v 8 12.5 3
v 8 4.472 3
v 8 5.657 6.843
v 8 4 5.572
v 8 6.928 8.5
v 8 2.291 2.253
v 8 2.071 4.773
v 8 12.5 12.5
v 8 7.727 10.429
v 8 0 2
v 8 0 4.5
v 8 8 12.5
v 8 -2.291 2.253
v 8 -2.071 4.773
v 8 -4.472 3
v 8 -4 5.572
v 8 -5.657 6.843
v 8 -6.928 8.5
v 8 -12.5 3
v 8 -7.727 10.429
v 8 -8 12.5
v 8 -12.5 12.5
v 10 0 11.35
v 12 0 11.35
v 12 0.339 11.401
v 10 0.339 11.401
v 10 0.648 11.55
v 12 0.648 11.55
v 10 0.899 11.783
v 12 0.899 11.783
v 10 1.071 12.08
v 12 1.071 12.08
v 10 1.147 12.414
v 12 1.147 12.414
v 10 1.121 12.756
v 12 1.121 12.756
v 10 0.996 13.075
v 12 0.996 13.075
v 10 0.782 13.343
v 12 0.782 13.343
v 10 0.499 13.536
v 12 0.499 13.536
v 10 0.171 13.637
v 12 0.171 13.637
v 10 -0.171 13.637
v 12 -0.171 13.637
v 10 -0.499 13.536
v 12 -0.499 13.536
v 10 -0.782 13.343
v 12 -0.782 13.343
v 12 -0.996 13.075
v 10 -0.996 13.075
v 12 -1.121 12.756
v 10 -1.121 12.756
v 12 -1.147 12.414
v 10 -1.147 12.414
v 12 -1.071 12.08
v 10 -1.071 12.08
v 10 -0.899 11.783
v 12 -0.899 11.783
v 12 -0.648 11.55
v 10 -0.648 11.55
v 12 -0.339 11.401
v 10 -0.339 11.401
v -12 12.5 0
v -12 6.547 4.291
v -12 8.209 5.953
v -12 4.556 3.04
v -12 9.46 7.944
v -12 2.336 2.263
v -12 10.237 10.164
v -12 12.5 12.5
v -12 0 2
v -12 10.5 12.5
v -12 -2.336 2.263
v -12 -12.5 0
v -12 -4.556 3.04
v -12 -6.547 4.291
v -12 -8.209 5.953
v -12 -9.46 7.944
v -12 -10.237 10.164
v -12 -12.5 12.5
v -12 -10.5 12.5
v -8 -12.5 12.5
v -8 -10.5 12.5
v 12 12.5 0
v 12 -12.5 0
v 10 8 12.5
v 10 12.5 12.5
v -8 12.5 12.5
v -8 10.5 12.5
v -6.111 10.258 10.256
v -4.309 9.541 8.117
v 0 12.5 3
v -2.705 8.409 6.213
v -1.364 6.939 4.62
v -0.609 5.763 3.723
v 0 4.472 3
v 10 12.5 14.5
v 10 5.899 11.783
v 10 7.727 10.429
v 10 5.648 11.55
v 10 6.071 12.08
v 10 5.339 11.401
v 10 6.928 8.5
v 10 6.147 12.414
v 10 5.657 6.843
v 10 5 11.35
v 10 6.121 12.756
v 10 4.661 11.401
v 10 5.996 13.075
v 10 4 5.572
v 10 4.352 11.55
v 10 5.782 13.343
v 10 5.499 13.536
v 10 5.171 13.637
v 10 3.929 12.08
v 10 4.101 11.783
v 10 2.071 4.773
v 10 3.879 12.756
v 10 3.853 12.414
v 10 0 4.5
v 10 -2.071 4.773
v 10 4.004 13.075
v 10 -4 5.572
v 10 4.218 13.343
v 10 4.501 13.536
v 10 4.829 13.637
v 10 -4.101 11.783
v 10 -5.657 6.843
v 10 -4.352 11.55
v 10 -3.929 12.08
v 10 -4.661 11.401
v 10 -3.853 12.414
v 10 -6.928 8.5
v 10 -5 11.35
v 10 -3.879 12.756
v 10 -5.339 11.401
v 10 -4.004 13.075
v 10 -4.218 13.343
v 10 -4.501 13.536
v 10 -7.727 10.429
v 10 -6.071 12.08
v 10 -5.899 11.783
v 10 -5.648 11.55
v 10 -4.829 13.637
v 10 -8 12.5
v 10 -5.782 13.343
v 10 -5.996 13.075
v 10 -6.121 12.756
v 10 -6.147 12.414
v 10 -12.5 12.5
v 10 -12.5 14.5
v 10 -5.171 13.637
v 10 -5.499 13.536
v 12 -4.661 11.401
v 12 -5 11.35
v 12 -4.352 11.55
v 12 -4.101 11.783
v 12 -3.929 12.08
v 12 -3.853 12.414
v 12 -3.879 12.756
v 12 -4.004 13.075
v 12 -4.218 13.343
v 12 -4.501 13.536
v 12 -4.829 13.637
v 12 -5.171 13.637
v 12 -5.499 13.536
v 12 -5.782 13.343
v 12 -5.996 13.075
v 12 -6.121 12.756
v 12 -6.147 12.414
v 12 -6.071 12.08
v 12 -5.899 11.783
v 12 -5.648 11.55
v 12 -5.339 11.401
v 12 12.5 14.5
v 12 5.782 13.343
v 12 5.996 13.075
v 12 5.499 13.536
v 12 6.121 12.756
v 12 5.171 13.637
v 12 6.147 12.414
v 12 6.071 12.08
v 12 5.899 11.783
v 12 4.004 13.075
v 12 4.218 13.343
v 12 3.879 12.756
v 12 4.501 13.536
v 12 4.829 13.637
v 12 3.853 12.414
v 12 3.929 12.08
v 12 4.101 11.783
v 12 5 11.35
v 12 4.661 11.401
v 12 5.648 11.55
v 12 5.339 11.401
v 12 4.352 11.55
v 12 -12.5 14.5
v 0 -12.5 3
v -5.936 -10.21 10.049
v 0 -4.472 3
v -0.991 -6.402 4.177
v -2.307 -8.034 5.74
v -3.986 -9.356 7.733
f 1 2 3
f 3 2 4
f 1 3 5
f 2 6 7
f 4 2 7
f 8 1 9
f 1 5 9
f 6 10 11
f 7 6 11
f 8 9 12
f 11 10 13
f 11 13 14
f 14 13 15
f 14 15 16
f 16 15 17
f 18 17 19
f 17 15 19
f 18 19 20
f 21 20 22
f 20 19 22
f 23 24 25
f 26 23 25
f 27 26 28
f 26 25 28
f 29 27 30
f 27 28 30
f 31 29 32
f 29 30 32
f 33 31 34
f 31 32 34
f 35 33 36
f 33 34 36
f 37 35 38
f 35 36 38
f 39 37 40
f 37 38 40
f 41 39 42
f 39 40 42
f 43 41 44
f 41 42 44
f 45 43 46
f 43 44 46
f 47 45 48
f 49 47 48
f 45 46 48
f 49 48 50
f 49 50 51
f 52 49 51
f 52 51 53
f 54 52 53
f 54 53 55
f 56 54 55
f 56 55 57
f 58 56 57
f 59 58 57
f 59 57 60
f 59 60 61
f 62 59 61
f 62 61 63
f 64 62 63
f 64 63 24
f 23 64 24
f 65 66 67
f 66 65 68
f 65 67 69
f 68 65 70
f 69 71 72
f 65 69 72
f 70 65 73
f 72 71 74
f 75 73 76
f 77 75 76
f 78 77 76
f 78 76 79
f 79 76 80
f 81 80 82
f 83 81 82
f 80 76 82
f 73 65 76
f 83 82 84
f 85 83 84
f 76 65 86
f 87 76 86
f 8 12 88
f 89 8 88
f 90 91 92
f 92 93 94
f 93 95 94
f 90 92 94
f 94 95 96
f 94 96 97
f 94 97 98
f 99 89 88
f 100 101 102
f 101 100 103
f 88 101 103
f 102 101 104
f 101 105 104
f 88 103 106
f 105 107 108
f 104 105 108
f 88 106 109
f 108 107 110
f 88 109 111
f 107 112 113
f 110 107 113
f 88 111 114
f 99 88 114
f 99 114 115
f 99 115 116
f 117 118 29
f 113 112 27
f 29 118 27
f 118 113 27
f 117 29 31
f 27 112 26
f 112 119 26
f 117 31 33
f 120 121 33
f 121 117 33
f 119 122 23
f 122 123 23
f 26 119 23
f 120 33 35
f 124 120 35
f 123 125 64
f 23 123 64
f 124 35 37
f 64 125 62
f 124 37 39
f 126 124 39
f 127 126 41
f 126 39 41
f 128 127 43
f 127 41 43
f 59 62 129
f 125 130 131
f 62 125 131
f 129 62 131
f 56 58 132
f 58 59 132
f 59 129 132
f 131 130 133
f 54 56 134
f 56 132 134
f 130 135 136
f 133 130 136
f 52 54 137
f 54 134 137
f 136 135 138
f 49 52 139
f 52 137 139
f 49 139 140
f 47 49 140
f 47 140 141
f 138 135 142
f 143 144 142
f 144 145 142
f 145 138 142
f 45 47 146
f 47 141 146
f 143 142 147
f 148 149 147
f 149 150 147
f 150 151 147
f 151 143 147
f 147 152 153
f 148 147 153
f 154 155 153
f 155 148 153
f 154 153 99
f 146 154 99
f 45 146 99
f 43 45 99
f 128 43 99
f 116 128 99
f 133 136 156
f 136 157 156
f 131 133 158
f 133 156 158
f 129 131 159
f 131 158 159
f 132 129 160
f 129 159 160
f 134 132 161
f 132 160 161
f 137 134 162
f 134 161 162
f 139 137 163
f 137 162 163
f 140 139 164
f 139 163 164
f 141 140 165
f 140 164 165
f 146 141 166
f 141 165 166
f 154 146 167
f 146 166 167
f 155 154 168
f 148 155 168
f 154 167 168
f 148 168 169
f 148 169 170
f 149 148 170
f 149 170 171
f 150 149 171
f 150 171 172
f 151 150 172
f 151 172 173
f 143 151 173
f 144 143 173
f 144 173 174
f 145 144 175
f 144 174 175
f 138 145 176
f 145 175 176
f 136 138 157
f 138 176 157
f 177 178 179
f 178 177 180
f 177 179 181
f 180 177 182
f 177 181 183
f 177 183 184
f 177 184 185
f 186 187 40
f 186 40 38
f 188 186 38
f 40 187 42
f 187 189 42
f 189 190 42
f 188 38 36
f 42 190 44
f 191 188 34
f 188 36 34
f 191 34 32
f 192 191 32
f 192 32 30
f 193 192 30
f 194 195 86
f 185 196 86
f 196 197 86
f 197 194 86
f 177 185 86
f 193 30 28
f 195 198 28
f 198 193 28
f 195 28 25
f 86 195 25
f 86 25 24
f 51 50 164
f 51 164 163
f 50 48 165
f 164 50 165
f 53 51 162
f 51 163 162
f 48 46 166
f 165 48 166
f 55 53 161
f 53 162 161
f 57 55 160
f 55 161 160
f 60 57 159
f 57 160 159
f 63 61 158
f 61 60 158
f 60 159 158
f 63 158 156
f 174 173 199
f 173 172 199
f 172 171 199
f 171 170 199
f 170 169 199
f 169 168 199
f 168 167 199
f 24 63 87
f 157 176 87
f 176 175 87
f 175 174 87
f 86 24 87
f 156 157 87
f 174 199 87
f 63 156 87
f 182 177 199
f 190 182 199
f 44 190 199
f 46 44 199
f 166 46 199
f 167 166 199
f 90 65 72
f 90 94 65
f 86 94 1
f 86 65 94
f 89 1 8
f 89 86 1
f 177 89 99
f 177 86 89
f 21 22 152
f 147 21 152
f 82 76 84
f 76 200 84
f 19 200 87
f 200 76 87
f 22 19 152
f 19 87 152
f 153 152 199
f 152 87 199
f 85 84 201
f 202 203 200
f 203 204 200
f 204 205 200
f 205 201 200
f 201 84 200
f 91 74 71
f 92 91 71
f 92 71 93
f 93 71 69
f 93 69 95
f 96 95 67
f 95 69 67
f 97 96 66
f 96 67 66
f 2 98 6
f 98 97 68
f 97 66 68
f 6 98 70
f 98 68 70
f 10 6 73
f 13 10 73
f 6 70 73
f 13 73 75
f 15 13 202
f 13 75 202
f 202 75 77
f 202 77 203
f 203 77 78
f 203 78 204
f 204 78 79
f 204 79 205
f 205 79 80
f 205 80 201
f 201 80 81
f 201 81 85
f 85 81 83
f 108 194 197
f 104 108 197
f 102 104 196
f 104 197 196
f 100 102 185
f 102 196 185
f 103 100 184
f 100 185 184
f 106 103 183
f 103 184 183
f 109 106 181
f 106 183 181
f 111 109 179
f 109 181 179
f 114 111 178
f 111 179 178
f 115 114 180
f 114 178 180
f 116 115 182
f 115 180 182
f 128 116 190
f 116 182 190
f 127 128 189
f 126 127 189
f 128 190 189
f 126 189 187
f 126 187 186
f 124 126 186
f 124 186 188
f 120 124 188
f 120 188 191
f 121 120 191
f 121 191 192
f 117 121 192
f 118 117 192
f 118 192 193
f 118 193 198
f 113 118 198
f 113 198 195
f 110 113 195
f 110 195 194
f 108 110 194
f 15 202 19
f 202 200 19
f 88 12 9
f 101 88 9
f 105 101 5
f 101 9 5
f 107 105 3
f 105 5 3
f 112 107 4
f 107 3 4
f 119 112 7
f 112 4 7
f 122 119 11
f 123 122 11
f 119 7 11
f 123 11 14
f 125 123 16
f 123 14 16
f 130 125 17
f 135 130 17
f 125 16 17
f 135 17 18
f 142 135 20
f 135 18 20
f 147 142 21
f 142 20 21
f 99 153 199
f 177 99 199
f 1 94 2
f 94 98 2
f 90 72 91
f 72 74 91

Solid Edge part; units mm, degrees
sketch "Sketch1" plane through (0, -12.5, 0) normal (0, -1, 0) x (1, 0, 0)
  line L0 (-12, 0) -> (-12, 12.5)
  line L1 (-12, 12.5) -> (-8, 12.5)
  line L2 (-8, 12.5) -> (0, 3)
  line L3 (0, 3) -> (8, 3)
  line L4 (8, 3) -> (8, 12.5)
  line L5 (8, 12.5) -> (10, 12.5)
  line L6 (10, 12.5) -> (10, 14.5)
  line L7 (10, 14.5) -> (12, 14.5)
  line L8 (12, 14.5) -> (12, 0)
  line L9 (-12, 0) -> (12, 0)
extrude "Protrusion1" add sketch "Sketch1" against normal up to vertex (25 mm away)
sketch "Sketch2" plane through (-12, 0, 6.25) normal (-1, 0, 0) x (0, -1, 0)
  circle A0 centre (0, 6.25) radius 10.5
extrude "Cutout1" cut sketch "Sketch2" against normal up to vertex (20 mm away)
sketch "Sketch3" plane through (8, 0, 7.75) normal (-1, 0, 0) x (0, -1, 0)
  circle A0 centre (0, 4.75) radius 8
extrude "Cutout2" cut sketch "Sketch3" against normal blind 2
hole "Hole_4" at (12, 5, 12.5) direction (-1, 0, 0) diameter 2.3 end up to next
hole "Hole1" at (12, 0, 12.5) direction (-1, 0, 0) diameter 2.3 end up to next
hole "Hole2" at (12, -5, 12.5) direction (-1, 0, 0) diameter 2.3 end up to next
